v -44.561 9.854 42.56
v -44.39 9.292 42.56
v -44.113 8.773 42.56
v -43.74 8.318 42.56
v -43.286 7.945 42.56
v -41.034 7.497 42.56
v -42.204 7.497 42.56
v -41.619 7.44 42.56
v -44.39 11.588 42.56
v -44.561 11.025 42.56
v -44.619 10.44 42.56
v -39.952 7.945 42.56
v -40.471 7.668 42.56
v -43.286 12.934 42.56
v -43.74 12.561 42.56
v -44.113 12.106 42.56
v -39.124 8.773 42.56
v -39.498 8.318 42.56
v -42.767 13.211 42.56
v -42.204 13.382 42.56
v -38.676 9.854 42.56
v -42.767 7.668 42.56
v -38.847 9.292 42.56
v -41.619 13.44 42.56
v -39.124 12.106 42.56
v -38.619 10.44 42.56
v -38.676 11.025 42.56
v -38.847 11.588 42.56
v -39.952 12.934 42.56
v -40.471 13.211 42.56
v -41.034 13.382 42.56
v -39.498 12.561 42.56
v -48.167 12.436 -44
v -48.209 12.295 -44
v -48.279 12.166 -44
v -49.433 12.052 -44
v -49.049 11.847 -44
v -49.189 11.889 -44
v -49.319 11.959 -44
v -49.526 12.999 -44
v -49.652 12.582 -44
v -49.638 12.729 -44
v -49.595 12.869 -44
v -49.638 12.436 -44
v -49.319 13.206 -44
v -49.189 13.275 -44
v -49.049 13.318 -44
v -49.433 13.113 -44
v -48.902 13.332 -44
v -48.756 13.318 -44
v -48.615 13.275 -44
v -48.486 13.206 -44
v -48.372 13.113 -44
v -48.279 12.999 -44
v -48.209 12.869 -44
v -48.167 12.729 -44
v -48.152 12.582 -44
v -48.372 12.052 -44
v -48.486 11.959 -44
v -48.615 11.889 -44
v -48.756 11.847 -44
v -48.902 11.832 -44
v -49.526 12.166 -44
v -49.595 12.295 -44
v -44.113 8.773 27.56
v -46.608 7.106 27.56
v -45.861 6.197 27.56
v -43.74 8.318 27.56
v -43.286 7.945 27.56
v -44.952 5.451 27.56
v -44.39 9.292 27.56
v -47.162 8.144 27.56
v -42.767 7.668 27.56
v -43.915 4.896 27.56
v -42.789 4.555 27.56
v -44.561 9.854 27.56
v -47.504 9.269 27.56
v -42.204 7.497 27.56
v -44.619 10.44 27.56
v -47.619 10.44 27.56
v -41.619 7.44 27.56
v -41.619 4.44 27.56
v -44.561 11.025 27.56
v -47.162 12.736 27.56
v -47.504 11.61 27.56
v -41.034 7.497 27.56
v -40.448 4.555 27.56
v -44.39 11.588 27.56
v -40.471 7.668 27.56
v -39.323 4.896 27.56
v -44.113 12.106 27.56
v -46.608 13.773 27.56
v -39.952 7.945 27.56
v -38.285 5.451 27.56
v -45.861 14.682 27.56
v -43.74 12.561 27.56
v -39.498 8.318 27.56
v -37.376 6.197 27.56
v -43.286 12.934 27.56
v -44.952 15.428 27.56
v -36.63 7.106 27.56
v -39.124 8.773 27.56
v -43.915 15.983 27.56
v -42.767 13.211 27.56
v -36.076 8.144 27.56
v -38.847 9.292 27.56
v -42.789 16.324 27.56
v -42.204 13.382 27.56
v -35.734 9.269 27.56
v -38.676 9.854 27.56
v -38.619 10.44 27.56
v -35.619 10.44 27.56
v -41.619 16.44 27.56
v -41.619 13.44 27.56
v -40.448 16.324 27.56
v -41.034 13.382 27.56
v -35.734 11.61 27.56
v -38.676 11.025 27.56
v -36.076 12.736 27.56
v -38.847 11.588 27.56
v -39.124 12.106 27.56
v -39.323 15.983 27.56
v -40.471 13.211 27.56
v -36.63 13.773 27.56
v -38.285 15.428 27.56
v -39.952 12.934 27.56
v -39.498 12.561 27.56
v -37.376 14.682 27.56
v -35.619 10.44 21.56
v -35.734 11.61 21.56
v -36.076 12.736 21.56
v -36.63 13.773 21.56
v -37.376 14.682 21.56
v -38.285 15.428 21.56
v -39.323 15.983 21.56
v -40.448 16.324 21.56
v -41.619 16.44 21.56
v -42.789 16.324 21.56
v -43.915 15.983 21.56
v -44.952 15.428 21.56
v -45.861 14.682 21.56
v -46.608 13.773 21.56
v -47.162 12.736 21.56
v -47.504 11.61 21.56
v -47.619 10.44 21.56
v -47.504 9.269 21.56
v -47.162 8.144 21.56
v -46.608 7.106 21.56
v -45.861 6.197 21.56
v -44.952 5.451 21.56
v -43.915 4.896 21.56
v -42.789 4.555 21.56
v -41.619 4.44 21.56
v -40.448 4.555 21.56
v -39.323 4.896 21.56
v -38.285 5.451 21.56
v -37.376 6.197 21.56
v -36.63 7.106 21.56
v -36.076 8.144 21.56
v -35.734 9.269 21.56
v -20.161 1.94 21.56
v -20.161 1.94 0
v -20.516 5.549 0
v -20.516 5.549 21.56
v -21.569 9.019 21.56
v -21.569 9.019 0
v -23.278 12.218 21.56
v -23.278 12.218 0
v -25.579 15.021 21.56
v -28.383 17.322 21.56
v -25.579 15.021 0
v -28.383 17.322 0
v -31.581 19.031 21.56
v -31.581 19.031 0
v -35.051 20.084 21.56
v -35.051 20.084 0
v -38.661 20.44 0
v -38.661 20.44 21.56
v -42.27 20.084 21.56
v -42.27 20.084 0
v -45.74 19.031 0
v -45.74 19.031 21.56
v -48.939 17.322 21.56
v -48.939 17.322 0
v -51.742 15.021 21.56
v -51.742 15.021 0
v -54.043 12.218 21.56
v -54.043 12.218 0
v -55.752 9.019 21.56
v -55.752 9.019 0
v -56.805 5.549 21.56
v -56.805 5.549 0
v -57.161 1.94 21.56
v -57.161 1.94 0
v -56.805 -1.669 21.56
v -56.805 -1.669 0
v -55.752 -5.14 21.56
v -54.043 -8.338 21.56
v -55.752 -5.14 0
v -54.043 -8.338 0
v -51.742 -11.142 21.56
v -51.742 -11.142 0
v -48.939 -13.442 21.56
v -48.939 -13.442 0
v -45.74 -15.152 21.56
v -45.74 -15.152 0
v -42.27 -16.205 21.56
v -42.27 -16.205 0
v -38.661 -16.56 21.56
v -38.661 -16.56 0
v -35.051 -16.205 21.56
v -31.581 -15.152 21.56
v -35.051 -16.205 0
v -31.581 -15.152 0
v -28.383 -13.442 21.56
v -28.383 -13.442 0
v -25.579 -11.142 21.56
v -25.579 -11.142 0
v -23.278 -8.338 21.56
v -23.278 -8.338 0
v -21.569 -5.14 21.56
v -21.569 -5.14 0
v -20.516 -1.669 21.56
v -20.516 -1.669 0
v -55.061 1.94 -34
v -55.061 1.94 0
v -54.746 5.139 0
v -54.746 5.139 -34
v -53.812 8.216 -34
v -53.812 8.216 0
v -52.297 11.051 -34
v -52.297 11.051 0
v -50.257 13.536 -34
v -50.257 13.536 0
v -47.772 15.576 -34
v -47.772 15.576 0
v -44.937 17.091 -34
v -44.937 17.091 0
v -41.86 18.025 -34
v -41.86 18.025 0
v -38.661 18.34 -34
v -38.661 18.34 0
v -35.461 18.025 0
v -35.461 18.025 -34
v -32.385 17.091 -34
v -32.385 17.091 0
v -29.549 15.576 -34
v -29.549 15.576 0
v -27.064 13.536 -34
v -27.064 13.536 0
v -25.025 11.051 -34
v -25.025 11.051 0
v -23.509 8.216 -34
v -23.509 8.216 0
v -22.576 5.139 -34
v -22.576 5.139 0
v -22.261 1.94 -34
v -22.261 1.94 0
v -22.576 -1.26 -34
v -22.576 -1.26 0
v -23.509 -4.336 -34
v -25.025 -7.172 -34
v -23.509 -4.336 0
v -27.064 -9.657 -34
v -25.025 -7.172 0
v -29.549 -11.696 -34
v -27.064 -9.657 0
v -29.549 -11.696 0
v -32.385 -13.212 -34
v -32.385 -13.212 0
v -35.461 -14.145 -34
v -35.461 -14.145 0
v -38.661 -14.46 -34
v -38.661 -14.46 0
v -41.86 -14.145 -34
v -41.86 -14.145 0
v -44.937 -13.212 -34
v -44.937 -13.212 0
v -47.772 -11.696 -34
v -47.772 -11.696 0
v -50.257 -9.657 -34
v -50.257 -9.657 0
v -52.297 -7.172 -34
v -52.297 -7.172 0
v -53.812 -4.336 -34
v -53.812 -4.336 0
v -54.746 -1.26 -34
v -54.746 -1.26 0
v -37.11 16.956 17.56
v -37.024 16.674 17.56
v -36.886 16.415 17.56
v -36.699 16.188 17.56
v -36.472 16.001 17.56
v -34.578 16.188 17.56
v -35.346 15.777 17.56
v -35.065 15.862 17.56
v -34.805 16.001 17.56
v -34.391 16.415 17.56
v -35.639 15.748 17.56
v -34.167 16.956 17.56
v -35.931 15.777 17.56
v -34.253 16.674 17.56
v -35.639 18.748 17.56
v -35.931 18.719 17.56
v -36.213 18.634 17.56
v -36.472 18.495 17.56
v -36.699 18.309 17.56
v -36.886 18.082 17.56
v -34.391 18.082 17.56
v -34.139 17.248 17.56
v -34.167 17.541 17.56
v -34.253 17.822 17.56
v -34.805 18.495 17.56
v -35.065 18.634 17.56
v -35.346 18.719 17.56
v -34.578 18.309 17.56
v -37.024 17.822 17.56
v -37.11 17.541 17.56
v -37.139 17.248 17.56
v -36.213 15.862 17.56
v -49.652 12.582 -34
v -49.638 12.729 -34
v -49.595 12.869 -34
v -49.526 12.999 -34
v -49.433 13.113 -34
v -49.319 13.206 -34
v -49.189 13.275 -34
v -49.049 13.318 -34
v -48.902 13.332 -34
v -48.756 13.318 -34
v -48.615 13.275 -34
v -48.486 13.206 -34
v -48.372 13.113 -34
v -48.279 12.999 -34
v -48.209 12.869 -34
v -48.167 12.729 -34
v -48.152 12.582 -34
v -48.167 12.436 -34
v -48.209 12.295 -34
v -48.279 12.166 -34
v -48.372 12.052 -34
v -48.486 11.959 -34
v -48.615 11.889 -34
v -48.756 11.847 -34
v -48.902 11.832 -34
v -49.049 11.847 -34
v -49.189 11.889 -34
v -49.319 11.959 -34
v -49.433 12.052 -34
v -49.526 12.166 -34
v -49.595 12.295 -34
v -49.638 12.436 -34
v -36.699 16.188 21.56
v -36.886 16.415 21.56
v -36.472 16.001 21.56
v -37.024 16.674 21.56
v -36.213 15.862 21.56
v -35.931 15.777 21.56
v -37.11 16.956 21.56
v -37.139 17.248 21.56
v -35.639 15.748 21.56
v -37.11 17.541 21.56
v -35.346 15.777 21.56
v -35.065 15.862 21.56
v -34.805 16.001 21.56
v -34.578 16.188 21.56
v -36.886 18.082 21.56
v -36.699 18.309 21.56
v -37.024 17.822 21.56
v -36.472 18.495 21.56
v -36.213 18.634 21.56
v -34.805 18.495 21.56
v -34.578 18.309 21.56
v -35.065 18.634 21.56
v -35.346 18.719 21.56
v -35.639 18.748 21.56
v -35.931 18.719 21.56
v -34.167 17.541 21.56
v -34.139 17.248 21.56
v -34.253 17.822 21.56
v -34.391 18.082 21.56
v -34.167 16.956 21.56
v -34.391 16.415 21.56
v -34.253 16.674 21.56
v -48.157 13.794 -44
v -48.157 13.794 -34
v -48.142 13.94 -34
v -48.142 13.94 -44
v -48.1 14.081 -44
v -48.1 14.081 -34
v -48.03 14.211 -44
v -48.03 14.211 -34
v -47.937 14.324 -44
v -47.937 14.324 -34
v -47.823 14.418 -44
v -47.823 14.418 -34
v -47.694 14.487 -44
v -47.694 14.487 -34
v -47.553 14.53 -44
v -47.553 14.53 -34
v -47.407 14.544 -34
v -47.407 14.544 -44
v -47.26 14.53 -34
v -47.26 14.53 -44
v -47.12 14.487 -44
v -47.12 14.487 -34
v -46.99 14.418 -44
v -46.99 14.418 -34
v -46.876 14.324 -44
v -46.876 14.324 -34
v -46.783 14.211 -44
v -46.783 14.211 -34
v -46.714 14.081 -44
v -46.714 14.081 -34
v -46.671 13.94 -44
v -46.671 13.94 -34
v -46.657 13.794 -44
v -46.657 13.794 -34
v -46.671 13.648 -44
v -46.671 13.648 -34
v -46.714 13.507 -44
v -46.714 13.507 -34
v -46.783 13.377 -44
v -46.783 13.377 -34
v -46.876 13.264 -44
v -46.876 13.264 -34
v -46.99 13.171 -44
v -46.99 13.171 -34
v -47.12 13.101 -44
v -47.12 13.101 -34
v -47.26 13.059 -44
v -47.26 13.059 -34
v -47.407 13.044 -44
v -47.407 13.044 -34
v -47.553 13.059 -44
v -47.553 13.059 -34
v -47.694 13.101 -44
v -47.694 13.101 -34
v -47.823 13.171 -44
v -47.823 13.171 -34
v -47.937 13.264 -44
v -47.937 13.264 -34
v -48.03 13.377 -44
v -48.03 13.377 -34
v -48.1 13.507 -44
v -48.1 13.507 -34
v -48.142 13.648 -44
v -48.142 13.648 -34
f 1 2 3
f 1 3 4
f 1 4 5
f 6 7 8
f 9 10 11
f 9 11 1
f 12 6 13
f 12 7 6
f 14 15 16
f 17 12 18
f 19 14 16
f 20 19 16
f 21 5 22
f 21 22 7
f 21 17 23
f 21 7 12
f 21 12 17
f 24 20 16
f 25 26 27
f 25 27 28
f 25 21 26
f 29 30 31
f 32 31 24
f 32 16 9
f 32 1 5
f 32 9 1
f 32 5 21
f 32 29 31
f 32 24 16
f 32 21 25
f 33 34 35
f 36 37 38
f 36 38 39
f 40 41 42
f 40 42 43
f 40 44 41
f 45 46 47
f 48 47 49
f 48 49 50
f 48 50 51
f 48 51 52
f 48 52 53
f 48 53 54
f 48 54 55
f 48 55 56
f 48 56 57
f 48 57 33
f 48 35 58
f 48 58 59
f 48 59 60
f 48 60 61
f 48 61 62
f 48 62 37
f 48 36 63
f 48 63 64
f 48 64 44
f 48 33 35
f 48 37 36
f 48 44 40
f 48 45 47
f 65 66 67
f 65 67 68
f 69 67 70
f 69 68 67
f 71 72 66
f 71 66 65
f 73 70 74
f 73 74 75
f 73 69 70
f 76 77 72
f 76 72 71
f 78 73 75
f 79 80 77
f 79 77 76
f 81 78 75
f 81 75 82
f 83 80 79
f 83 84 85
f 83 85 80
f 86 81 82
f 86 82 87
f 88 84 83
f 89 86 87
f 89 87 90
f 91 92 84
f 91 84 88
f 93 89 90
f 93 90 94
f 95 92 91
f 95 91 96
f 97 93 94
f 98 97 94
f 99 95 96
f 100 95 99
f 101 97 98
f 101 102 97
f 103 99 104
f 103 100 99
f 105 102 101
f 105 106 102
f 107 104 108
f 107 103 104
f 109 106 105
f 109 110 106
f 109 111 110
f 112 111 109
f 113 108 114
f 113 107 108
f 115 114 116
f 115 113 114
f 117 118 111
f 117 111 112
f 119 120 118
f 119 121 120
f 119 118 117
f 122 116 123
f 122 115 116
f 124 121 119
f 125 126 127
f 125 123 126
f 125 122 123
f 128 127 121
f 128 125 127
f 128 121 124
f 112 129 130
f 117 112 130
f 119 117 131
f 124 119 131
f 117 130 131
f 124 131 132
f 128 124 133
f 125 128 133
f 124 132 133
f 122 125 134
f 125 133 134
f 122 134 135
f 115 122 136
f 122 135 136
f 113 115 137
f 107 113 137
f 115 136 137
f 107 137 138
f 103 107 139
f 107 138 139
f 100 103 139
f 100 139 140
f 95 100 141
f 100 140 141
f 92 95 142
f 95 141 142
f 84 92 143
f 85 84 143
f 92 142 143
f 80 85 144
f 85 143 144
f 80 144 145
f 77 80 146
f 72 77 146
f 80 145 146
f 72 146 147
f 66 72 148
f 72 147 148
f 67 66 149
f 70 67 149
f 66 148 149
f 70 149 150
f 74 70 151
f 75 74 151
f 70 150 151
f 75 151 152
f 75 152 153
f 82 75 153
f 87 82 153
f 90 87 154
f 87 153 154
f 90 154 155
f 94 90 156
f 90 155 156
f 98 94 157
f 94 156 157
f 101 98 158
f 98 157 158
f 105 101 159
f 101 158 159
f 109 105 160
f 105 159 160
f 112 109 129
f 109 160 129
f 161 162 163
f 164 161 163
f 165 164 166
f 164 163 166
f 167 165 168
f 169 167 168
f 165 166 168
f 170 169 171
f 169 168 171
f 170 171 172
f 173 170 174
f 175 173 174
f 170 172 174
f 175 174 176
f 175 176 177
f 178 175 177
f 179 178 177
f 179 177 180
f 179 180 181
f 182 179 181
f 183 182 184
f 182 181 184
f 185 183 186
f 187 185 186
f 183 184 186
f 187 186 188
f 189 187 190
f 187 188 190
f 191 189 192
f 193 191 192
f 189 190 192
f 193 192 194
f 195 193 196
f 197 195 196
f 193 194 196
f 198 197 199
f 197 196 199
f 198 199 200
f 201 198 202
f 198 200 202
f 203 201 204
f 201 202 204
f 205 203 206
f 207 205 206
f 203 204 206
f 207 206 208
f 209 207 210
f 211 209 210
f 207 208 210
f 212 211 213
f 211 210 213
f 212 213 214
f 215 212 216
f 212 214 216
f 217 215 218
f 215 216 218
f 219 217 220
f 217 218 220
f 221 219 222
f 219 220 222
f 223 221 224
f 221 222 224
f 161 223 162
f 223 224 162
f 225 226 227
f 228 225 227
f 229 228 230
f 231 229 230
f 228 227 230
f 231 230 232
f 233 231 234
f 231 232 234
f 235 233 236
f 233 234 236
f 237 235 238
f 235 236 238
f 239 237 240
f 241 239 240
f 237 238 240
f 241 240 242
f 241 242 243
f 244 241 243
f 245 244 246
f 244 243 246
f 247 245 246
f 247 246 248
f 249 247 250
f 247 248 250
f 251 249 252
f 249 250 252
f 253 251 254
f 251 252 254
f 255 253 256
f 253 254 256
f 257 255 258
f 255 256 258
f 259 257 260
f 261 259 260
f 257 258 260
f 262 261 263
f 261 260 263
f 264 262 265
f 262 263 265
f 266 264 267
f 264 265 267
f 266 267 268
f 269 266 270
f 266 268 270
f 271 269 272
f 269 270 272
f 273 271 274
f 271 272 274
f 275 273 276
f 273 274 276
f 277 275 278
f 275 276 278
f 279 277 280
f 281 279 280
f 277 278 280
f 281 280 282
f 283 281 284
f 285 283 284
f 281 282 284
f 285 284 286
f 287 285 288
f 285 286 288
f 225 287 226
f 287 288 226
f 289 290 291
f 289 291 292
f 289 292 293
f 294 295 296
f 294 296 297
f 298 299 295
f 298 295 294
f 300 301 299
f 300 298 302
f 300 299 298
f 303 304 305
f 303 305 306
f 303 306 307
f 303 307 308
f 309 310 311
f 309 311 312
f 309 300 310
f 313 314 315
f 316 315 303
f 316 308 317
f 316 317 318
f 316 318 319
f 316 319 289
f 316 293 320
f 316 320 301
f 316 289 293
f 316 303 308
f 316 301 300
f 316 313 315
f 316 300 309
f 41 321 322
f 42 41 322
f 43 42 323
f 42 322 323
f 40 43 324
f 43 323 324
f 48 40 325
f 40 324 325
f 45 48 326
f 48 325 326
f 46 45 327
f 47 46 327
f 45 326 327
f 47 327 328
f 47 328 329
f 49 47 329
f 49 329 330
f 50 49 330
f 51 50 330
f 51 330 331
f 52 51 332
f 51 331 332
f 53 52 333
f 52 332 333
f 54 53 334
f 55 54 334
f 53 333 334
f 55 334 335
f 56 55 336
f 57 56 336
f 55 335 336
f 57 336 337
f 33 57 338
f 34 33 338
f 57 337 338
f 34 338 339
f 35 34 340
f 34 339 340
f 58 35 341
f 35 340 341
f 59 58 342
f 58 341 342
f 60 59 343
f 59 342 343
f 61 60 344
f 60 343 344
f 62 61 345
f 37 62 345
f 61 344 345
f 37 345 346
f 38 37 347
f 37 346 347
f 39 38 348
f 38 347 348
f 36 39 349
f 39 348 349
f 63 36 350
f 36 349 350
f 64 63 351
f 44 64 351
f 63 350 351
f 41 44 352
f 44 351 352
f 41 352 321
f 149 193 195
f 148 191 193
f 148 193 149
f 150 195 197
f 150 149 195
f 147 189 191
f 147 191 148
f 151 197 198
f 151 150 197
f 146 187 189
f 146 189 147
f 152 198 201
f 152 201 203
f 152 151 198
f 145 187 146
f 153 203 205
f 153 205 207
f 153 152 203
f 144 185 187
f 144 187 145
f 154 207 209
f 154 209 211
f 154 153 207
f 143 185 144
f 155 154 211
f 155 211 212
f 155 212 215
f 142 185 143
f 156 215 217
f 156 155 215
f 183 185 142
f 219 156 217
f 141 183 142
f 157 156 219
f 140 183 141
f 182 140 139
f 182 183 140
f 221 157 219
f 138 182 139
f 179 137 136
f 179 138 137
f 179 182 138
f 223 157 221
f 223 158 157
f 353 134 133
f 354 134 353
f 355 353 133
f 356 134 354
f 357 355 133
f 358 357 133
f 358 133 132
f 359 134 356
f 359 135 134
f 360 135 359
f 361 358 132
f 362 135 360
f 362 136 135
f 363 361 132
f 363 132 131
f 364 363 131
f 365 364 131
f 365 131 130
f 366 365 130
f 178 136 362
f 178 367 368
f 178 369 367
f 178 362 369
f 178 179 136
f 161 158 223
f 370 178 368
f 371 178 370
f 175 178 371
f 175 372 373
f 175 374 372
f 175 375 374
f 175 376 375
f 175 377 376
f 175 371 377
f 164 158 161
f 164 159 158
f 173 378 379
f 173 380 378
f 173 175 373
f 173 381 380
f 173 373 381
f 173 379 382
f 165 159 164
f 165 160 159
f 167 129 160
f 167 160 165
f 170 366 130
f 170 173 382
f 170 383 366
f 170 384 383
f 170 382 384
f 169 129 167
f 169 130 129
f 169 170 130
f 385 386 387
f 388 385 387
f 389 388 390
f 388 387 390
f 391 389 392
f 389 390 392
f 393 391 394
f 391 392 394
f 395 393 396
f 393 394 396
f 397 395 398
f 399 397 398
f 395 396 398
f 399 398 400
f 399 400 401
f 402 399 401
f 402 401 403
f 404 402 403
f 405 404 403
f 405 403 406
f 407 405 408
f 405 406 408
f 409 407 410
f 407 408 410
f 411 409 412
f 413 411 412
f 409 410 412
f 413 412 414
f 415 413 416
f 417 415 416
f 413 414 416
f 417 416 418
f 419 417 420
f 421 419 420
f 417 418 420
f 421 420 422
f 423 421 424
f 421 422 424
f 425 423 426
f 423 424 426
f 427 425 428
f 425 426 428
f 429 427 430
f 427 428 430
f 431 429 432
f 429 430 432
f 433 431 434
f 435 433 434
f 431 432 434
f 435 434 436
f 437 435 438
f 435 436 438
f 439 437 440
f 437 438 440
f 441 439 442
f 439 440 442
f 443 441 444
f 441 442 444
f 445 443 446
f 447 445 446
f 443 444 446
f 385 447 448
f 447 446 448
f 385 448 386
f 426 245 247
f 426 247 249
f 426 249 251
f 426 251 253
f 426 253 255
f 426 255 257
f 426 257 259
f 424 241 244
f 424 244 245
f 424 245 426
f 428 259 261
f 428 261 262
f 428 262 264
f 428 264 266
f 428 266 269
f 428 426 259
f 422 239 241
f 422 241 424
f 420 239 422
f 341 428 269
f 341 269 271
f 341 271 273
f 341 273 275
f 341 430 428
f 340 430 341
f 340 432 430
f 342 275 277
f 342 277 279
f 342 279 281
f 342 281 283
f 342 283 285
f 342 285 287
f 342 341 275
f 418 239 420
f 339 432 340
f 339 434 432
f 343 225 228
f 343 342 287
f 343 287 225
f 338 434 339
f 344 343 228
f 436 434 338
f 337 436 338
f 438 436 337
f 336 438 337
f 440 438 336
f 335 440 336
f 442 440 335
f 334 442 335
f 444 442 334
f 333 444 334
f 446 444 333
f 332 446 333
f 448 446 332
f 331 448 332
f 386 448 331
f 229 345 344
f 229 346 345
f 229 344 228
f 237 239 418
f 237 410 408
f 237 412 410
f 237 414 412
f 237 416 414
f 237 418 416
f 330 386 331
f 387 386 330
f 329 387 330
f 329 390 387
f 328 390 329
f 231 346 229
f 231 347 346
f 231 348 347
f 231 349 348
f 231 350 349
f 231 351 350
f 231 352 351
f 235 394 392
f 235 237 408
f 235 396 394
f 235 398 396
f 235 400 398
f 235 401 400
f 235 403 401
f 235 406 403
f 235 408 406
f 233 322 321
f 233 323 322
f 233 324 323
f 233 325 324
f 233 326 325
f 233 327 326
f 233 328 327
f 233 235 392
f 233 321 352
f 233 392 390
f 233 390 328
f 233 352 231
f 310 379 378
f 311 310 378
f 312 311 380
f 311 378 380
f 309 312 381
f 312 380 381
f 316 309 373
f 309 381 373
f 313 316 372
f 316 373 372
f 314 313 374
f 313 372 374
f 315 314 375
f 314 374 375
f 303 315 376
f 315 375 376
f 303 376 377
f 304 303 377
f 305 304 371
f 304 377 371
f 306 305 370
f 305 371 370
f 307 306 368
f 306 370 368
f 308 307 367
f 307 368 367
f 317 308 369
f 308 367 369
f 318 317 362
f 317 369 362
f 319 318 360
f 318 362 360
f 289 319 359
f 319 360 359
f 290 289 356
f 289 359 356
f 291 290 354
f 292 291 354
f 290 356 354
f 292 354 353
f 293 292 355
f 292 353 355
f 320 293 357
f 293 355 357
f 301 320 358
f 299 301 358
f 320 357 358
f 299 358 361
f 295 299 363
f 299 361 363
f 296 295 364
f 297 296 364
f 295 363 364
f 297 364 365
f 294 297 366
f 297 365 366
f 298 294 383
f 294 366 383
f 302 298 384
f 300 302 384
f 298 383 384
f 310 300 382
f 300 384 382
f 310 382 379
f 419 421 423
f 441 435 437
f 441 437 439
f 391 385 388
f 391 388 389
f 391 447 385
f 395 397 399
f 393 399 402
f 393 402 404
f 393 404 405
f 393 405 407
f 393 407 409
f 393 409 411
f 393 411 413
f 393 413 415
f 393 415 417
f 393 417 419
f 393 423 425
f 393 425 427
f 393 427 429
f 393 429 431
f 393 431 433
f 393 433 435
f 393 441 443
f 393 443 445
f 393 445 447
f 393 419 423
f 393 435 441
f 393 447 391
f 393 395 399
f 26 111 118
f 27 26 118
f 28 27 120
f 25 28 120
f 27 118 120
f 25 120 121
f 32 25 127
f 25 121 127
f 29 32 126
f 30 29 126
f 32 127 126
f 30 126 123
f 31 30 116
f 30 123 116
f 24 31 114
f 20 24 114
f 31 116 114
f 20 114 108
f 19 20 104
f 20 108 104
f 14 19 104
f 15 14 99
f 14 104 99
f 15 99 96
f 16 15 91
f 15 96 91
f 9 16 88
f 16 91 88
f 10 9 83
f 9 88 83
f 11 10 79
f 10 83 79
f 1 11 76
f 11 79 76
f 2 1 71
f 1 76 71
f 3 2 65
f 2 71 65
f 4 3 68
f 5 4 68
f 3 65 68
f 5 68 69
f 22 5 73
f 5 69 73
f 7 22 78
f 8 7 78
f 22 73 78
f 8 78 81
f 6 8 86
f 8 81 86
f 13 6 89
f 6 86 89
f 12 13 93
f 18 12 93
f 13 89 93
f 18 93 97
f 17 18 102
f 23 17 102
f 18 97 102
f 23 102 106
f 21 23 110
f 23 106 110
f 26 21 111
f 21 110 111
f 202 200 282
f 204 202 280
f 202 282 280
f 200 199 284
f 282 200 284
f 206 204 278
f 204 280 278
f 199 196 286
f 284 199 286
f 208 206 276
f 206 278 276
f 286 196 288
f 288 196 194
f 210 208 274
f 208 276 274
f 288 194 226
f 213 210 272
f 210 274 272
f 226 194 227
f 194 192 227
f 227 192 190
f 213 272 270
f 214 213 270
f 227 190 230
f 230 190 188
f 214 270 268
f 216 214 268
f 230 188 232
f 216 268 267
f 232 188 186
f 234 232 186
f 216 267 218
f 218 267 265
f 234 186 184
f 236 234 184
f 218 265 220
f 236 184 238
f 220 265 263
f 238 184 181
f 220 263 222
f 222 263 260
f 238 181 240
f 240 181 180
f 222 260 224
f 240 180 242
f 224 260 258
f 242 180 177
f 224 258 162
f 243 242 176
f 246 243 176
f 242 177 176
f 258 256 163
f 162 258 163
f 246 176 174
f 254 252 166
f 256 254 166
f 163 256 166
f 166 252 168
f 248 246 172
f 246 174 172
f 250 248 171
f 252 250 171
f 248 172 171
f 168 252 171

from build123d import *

# Parameters (mm, degrees)
SKETCH1_R           = 18.5
BOSS_EXTRUDE1_DEPTH = 21.56
SKETCH2_R           = 6
BOSS_EXTRUDE2_DEPTH = 6
SKETCH3_R           = 3
BOSS_EXTRUDE3_DEPTH = 15
SKETCH4_R           = 1.5
CUT_EXTRUDE1_DEPTH  = 4
SKETCH5_R           = 16.4
BOSS_EXTRUDE4_DEPTH = 34
SKETCH7_R           = 0.75
BOSS_EXTRUDE5_DEPTH = 10
SKETCH8_R           = 0.75
BOSS_EXTRUDE6_DEPTH = 10


with BuildPart() as part:
    # Sketch1 → Boss-Extrude1 (new body)
    with BuildSketch(Plane.XY):
        with Locations((-38.660623091, 1.939719844)):
            Circle(SKETCH1_R)
    extrude(amount=BOSS_EXTRUDE1_DEPTH)

    # Sketch2 → Boss-Extrude2 (add)
    with BuildSketch(Plane.XY.offset(21.56)):
        with Locations((-41.618854638, 10.439653144)):
            Circle(SKETCH2_R)
    extrude(amount=BOSS_EXTRUDE2_DEPTH)

    # Sketch3 → Boss-Extrude3 (add)
    with BuildSketch(Plane.XY.offset(27.56)):
        with Locations((-41.618854638, 10.439653144)):
            Circle(SKETCH3_R)
    extrude(amount=BOSS_EXTRUDE3_DEPTH)

    # Sketch4 → Cut-Extrude1 (cut)
    with BuildSketch(Plane.XY.offset(21.56)):
        with Locations((-35.638553095, 17.248200675)):
            Circle(SKETCH4_R)
    extrude(amount=-CUT_EXTRUDE1_DEPTH, mode=Mode.SUBTRACT)

    # Sketch5 → Boss-Extrude4 (add)
    with BuildSketch(Plane(origin=(0, 0, 0), x_dir=(-1, 0, 0), z_dir=(0, 0, -1))):
        with Locations((38.660623091, 1.939719844)):
            Circle(SKETCH5_R)
    extrude(amount=BOSS_EXTRUDE4_DEPTH)

    # Sketch7 → Boss-Extrude5 (add)
    with BuildSketch(Plane(origin=(0, 0, -34), x_dir=(-1, 0, 0), z_dir=(0, 0, -1))):
        with Locations((47.406680411, 13.79413532)):
            Circle(SKETCH7_R)
    extrude(amount=BOSS_EXTRUDE5_DEPTH)

    # Sketch8 → Boss-Extrude6 (add)
    with BuildSketch(Plane(origin=(0, 0, -34), x_dir=(-1, 0, 0), z_dir=(0, 0, -1))):
        with Locations((48.902224114, 12.582392087)):
            Circle(SKETCH8_R)
    extrude(amount=BOSS_EXTRUDE6_DEPTH)


solid = part.part
